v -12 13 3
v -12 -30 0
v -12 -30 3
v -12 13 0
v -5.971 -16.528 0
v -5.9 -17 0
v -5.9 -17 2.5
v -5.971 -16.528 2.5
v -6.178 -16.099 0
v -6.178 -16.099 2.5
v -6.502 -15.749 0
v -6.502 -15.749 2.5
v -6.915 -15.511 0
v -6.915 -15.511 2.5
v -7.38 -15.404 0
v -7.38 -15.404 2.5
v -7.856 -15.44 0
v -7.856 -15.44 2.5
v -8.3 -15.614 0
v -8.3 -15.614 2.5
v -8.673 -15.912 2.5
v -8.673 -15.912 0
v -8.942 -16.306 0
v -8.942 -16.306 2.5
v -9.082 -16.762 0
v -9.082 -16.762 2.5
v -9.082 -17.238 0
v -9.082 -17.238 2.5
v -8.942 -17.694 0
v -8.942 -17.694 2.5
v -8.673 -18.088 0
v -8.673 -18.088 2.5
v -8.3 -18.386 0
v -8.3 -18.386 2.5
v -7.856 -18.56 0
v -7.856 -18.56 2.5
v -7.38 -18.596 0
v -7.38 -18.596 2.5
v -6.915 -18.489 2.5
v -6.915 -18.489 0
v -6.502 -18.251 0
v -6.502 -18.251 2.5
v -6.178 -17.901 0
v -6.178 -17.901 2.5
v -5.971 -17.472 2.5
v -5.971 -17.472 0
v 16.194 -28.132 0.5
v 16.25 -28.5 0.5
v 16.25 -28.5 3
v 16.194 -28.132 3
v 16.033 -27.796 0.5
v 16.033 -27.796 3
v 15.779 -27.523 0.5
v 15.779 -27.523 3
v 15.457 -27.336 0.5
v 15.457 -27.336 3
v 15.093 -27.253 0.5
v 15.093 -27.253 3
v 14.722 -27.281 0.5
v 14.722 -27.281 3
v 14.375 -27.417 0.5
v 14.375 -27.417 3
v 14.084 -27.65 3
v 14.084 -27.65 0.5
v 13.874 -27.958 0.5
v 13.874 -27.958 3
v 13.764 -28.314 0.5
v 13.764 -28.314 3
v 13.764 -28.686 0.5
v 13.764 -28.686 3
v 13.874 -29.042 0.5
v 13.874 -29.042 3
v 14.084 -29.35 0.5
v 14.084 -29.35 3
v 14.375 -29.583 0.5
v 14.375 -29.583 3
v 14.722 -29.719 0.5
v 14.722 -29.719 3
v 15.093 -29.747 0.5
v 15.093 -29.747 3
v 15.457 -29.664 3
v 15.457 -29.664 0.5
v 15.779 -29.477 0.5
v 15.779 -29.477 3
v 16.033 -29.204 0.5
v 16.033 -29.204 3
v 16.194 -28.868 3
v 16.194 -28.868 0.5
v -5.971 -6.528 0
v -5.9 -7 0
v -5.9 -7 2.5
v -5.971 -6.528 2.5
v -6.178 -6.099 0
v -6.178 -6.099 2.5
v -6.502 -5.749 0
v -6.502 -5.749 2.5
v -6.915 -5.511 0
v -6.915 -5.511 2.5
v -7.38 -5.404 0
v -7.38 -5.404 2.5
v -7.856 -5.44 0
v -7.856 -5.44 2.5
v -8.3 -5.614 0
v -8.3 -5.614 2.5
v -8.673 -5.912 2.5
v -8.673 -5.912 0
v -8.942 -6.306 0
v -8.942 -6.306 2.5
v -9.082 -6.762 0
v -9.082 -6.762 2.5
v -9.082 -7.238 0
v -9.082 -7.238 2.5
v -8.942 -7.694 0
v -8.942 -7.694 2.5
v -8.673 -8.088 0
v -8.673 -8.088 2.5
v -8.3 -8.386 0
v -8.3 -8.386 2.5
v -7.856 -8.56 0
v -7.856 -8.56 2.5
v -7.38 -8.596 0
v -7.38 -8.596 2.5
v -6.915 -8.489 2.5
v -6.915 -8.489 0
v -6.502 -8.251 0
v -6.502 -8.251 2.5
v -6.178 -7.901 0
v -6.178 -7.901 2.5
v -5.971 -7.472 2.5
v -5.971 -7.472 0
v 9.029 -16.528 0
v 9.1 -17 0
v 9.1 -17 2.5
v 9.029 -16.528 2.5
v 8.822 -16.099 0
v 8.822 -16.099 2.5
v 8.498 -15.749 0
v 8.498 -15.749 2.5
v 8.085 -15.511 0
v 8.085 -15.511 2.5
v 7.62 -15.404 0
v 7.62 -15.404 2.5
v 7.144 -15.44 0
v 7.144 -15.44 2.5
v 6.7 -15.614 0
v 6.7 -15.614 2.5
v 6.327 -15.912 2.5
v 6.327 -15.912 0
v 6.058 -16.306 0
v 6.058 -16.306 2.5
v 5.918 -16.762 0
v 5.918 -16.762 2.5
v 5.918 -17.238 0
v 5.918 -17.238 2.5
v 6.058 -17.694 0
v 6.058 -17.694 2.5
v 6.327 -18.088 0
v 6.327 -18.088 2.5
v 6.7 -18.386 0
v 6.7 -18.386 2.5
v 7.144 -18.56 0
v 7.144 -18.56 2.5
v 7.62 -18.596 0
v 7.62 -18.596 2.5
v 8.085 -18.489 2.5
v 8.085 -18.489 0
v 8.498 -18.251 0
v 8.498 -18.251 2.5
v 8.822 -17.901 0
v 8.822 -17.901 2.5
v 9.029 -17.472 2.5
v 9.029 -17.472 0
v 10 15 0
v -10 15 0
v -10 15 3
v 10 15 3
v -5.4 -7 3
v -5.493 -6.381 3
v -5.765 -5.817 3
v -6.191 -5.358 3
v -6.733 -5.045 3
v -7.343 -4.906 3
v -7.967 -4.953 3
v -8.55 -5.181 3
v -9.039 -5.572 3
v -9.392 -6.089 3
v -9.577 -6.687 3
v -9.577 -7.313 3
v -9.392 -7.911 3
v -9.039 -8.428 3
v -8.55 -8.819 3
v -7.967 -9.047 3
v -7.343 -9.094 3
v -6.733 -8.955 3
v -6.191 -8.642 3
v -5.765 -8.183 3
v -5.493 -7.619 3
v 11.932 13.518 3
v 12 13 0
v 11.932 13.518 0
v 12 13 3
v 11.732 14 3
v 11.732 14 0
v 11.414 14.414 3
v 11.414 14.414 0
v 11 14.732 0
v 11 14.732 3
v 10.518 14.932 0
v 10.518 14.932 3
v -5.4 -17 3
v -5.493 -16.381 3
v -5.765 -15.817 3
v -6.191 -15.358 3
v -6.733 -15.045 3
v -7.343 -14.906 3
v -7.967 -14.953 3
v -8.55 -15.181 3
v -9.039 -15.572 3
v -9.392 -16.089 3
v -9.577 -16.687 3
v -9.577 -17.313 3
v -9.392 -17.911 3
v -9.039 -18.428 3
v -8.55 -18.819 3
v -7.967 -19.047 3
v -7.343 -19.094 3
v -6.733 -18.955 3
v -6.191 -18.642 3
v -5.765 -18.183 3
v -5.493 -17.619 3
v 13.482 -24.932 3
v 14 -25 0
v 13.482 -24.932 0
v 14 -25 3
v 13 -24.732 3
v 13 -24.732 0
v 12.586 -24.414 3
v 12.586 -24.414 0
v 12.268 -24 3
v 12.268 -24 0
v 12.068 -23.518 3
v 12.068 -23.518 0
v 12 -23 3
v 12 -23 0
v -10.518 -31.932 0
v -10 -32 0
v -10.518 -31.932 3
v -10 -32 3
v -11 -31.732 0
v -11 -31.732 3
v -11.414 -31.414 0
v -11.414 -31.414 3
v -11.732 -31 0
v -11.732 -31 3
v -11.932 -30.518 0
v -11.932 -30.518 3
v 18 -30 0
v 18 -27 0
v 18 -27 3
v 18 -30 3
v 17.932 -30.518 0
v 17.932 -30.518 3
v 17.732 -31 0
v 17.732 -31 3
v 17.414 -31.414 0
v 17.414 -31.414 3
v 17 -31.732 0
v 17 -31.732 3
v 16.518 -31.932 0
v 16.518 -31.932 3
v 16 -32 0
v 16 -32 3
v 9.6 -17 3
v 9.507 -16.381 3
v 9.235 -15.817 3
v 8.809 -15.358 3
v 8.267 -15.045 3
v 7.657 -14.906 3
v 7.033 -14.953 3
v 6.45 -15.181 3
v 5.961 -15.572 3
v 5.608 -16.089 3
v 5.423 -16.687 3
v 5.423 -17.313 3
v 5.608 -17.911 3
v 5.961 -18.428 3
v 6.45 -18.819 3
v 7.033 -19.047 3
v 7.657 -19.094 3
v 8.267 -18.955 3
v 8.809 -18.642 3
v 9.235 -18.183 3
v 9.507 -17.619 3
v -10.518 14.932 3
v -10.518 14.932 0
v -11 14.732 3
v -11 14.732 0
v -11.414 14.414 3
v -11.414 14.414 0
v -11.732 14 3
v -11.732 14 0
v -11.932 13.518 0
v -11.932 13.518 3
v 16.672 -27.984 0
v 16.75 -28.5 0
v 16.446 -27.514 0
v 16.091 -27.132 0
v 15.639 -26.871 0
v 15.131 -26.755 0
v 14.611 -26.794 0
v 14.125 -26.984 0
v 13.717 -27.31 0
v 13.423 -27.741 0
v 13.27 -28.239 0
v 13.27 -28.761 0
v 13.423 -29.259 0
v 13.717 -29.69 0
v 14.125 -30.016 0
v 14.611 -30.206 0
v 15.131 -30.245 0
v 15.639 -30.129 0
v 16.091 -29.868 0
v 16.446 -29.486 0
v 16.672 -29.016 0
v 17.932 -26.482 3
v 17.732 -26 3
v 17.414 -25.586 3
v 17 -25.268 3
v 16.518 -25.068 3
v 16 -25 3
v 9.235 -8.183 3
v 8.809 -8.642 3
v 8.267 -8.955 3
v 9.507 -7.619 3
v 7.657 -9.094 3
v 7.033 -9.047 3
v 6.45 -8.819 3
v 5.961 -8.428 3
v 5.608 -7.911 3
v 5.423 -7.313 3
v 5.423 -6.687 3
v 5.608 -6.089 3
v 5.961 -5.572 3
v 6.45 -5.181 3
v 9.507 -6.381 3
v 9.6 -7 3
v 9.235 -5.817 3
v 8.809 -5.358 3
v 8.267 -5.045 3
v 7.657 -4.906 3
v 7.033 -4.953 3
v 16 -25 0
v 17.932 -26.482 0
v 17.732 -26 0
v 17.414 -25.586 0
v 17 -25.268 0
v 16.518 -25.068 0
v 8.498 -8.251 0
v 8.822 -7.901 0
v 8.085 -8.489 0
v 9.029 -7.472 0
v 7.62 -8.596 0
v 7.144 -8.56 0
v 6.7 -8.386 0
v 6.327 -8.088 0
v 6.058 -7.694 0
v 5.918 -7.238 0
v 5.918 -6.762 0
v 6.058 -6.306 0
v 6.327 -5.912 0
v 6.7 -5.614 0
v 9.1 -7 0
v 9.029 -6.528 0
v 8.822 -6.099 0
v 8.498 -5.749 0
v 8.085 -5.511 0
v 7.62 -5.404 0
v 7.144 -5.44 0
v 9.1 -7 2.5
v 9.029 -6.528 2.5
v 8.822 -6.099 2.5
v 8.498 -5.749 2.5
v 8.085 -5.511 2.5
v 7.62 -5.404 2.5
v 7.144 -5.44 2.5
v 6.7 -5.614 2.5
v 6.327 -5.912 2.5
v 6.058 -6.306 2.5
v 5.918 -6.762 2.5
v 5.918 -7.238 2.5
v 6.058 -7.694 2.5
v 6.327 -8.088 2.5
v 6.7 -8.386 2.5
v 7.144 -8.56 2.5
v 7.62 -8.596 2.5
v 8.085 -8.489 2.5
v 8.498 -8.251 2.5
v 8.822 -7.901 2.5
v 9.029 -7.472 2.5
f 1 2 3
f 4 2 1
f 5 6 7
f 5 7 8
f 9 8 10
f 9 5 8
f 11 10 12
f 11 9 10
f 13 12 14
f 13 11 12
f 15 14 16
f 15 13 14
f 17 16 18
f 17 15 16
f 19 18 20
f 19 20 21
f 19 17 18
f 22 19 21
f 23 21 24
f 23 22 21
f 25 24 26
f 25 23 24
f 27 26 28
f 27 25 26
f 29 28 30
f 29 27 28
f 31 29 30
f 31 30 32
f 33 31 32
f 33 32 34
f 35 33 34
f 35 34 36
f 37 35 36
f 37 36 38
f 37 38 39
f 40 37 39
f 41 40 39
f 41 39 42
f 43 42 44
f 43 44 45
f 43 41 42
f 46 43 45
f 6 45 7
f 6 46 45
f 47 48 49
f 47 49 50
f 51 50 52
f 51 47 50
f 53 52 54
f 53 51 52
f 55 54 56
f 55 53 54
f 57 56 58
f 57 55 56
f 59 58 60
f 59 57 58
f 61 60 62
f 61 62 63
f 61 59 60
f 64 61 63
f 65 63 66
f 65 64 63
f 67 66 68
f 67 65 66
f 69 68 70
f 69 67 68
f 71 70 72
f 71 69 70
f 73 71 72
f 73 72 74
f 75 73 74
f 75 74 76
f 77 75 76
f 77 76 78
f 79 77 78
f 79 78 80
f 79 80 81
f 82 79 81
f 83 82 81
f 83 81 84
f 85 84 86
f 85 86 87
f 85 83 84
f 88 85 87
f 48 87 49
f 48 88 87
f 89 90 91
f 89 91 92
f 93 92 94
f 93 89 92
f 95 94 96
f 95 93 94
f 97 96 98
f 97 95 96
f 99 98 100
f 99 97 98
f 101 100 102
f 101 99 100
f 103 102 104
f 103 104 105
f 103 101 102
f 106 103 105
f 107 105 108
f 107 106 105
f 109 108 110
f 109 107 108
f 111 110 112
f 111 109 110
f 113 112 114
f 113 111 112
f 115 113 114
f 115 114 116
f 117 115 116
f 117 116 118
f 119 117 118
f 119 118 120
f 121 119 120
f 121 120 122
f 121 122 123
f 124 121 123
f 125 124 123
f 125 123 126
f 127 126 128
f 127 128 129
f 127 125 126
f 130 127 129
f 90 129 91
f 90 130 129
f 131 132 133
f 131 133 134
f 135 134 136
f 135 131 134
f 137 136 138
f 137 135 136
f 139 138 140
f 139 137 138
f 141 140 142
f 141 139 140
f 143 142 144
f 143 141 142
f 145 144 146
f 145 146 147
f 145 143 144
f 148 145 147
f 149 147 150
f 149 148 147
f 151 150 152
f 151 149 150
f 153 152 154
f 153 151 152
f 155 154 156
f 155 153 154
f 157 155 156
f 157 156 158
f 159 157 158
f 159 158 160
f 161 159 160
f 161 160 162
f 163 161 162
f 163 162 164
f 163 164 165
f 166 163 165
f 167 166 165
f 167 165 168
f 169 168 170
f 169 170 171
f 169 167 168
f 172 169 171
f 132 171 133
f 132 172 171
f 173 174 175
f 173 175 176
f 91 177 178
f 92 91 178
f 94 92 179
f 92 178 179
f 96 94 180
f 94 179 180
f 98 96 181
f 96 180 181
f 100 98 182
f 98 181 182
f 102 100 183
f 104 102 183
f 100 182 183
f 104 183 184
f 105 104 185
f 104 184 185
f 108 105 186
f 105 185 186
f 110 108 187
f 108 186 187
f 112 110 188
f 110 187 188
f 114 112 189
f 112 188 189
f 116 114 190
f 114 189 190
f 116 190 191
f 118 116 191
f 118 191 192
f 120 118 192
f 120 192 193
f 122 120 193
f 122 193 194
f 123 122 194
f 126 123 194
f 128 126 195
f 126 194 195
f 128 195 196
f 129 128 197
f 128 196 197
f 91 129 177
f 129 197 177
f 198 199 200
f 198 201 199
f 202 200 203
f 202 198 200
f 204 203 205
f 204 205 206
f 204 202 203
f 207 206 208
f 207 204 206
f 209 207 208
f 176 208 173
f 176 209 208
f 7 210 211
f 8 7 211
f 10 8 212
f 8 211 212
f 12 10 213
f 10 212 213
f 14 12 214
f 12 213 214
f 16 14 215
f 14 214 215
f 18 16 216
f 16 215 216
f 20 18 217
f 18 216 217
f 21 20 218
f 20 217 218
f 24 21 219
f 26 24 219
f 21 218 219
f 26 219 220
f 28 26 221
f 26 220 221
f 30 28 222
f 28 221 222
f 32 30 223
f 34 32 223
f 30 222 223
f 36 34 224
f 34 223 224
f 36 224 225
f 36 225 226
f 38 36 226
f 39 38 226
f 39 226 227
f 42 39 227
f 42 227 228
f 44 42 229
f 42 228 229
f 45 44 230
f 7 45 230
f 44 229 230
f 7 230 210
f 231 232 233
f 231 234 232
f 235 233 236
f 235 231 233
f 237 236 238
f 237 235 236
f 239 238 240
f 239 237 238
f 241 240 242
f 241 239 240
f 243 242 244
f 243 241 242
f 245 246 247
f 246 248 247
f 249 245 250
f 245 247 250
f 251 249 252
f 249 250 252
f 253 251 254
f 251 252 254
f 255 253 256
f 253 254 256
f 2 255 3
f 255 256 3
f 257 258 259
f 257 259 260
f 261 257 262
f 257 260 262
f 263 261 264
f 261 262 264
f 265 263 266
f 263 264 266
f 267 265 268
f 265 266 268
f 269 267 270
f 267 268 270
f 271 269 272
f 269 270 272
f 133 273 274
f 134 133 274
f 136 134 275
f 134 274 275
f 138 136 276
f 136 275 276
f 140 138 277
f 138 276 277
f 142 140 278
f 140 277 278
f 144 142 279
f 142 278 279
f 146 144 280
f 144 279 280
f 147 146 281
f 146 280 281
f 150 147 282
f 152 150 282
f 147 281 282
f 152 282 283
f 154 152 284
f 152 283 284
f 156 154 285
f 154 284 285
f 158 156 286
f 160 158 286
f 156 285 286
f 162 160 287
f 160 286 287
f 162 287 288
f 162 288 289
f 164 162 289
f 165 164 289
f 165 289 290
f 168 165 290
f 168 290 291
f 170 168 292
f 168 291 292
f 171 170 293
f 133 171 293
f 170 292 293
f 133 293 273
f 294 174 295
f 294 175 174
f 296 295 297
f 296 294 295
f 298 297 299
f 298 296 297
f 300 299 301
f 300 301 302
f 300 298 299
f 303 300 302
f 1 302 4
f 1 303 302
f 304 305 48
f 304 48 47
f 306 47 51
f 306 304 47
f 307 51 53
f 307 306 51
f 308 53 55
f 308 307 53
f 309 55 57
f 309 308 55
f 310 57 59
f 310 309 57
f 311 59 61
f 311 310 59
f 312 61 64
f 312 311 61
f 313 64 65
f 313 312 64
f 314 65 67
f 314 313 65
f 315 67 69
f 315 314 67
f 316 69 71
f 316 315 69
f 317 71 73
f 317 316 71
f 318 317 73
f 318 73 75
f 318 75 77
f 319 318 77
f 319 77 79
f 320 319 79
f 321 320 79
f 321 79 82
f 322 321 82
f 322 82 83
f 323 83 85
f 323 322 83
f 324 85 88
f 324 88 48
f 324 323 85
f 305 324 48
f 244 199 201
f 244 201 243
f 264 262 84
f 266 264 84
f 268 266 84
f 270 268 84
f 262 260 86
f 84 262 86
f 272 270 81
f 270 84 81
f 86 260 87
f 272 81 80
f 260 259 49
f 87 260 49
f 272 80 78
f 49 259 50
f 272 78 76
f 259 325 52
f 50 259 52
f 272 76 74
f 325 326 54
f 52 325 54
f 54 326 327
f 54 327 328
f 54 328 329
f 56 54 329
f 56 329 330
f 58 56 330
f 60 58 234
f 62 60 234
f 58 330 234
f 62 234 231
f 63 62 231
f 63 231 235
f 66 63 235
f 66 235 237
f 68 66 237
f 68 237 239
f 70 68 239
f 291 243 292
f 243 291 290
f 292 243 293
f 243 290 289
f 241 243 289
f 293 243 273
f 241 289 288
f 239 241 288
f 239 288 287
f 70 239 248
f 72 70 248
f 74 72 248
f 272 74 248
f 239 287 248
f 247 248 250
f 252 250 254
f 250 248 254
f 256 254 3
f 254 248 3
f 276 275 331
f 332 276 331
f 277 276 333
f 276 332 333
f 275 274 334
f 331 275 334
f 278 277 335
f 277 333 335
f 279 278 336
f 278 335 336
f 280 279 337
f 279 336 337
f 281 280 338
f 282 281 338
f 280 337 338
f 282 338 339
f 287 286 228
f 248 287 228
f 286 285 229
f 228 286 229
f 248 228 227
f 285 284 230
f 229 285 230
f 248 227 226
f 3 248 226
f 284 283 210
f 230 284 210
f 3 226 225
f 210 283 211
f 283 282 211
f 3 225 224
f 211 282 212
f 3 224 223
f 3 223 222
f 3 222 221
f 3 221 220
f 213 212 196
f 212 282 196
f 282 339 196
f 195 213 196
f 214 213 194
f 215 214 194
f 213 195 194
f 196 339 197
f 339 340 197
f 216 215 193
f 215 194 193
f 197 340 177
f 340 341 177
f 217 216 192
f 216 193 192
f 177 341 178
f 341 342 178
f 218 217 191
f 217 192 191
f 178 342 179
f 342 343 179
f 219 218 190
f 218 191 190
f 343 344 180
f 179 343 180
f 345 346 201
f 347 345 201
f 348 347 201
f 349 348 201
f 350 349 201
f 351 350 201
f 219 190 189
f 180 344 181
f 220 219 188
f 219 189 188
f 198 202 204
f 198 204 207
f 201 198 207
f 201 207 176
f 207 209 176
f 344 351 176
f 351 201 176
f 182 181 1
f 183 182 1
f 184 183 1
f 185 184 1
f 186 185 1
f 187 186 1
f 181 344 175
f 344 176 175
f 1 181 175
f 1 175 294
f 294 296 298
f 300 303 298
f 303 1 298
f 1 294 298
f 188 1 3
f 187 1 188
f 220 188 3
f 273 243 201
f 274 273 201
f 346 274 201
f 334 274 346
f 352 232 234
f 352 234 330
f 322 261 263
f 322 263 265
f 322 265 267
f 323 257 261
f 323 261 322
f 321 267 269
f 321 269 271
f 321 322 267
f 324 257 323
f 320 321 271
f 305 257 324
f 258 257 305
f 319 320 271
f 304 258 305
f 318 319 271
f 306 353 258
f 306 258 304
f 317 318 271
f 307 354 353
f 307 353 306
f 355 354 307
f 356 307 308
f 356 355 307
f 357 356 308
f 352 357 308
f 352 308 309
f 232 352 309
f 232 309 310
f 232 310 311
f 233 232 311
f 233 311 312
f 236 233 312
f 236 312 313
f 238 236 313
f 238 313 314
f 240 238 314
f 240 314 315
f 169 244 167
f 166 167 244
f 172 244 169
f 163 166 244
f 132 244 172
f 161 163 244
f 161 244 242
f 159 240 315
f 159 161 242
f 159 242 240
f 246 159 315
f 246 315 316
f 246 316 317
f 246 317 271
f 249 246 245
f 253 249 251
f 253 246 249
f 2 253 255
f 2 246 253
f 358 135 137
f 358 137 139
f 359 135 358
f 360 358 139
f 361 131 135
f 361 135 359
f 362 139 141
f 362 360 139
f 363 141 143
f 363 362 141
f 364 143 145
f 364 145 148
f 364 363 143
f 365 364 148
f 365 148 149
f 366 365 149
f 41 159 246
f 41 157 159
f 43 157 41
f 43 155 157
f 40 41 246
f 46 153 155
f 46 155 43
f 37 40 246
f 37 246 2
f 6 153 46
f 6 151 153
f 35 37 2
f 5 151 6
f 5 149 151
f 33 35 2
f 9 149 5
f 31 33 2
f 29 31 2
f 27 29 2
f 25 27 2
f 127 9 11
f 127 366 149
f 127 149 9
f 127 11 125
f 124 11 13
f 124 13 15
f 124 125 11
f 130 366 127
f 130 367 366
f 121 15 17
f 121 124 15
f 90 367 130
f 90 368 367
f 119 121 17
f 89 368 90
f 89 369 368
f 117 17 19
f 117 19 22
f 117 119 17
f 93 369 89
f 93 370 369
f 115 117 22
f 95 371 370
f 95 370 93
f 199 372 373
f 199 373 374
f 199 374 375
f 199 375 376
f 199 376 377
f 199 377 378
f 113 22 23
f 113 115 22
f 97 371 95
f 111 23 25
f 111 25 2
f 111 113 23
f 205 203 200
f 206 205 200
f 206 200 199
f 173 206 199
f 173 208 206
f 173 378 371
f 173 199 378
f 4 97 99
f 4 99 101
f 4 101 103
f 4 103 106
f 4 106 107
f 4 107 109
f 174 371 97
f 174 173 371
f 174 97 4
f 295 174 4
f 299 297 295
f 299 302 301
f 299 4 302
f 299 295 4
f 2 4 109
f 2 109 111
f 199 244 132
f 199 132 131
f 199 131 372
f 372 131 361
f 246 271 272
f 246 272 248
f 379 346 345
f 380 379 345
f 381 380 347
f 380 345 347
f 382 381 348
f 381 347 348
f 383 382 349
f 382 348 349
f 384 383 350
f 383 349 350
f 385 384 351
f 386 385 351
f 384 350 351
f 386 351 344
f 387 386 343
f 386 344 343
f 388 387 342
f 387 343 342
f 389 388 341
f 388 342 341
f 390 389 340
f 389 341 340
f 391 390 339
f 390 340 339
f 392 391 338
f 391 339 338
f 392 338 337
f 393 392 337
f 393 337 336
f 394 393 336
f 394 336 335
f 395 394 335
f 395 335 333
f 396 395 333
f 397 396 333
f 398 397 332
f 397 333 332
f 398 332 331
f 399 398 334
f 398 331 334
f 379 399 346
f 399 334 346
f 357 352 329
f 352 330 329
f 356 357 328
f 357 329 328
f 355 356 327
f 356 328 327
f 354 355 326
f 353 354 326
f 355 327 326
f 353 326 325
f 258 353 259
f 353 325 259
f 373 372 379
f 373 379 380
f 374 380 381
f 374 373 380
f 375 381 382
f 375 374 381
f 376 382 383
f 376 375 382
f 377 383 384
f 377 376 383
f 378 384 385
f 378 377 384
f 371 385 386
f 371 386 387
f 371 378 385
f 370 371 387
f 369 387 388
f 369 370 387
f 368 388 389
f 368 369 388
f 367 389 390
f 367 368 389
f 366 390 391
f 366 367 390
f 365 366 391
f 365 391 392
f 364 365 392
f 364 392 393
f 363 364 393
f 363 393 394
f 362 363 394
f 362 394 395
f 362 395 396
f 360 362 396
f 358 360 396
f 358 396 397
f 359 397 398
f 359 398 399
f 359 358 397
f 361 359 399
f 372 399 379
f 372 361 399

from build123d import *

# Parameters (mm, degrees)
SKETCH_1_R      = 1.6
SKETCH_1_R_2    = 1.25
EXTRUDE_1_DEPTH = 3
CHAMFER_1_SIZE  = 0.5
FILLET_1_R      = 2


with BuildPart() as part:
    # 草图1 → 凸台-拉伸1 (new body)
    with BuildSketch(Plane.XY):
        Polygon((12, -25), (18, -25), (18, -32), (-12, -32), (-12, 15), (12, 15), align=None)
        with Locations((-7.5, -7)):
            Circle(SKETCH_1_R, mode=Mode.SUBTRACT)
        with Locations((7.5, -7)):
            Circle(SKETCH_1_R, mode=Mode.SUBTRACT)
        with Locations((-7.5, -17)):
            Circle(SKETCH_1_R, mode=Mode.SUBTRACT)
        with Locations((7.5, -17)):
            Circle(SKETCH_1_R, mode=Mode.SUBTRACT)
        with Locations((15, -28.5)):
            Circle(SKETCH_1_R_2, mode=Mode.SUBTRACT)
    extrude(amount=EXTRUDE_1_DEPTH)

    # 倒角1
    chamfer_1_edges = [part.edges().sort_by_distance(p)[0] for p in [
        (13.75, -28.5, 0),
        (-9.1, -7, 3),
        (5.9, -7, 3),
        (-9.1, -17, 3),
        (5.9, -17, 3),
    ]]
    chamfer(chamfer_1_edges, length=CHAMFER_1_SIZE)

    # 圆角1
    fillet_1_edges = [part.edges().sort_by_distance(p)[0] for p in [
        (-12, -32, 1.5),
        (-12, 15, 1.5),
        (12, 15, 1.5),
        (12, -25, 1.5),
        (18, -25, 1.5),
        (18, -32, 1.5),
    ]]
    fillet(fillet_1_edges, radius=FILLET_1_R)


solid = part.part
